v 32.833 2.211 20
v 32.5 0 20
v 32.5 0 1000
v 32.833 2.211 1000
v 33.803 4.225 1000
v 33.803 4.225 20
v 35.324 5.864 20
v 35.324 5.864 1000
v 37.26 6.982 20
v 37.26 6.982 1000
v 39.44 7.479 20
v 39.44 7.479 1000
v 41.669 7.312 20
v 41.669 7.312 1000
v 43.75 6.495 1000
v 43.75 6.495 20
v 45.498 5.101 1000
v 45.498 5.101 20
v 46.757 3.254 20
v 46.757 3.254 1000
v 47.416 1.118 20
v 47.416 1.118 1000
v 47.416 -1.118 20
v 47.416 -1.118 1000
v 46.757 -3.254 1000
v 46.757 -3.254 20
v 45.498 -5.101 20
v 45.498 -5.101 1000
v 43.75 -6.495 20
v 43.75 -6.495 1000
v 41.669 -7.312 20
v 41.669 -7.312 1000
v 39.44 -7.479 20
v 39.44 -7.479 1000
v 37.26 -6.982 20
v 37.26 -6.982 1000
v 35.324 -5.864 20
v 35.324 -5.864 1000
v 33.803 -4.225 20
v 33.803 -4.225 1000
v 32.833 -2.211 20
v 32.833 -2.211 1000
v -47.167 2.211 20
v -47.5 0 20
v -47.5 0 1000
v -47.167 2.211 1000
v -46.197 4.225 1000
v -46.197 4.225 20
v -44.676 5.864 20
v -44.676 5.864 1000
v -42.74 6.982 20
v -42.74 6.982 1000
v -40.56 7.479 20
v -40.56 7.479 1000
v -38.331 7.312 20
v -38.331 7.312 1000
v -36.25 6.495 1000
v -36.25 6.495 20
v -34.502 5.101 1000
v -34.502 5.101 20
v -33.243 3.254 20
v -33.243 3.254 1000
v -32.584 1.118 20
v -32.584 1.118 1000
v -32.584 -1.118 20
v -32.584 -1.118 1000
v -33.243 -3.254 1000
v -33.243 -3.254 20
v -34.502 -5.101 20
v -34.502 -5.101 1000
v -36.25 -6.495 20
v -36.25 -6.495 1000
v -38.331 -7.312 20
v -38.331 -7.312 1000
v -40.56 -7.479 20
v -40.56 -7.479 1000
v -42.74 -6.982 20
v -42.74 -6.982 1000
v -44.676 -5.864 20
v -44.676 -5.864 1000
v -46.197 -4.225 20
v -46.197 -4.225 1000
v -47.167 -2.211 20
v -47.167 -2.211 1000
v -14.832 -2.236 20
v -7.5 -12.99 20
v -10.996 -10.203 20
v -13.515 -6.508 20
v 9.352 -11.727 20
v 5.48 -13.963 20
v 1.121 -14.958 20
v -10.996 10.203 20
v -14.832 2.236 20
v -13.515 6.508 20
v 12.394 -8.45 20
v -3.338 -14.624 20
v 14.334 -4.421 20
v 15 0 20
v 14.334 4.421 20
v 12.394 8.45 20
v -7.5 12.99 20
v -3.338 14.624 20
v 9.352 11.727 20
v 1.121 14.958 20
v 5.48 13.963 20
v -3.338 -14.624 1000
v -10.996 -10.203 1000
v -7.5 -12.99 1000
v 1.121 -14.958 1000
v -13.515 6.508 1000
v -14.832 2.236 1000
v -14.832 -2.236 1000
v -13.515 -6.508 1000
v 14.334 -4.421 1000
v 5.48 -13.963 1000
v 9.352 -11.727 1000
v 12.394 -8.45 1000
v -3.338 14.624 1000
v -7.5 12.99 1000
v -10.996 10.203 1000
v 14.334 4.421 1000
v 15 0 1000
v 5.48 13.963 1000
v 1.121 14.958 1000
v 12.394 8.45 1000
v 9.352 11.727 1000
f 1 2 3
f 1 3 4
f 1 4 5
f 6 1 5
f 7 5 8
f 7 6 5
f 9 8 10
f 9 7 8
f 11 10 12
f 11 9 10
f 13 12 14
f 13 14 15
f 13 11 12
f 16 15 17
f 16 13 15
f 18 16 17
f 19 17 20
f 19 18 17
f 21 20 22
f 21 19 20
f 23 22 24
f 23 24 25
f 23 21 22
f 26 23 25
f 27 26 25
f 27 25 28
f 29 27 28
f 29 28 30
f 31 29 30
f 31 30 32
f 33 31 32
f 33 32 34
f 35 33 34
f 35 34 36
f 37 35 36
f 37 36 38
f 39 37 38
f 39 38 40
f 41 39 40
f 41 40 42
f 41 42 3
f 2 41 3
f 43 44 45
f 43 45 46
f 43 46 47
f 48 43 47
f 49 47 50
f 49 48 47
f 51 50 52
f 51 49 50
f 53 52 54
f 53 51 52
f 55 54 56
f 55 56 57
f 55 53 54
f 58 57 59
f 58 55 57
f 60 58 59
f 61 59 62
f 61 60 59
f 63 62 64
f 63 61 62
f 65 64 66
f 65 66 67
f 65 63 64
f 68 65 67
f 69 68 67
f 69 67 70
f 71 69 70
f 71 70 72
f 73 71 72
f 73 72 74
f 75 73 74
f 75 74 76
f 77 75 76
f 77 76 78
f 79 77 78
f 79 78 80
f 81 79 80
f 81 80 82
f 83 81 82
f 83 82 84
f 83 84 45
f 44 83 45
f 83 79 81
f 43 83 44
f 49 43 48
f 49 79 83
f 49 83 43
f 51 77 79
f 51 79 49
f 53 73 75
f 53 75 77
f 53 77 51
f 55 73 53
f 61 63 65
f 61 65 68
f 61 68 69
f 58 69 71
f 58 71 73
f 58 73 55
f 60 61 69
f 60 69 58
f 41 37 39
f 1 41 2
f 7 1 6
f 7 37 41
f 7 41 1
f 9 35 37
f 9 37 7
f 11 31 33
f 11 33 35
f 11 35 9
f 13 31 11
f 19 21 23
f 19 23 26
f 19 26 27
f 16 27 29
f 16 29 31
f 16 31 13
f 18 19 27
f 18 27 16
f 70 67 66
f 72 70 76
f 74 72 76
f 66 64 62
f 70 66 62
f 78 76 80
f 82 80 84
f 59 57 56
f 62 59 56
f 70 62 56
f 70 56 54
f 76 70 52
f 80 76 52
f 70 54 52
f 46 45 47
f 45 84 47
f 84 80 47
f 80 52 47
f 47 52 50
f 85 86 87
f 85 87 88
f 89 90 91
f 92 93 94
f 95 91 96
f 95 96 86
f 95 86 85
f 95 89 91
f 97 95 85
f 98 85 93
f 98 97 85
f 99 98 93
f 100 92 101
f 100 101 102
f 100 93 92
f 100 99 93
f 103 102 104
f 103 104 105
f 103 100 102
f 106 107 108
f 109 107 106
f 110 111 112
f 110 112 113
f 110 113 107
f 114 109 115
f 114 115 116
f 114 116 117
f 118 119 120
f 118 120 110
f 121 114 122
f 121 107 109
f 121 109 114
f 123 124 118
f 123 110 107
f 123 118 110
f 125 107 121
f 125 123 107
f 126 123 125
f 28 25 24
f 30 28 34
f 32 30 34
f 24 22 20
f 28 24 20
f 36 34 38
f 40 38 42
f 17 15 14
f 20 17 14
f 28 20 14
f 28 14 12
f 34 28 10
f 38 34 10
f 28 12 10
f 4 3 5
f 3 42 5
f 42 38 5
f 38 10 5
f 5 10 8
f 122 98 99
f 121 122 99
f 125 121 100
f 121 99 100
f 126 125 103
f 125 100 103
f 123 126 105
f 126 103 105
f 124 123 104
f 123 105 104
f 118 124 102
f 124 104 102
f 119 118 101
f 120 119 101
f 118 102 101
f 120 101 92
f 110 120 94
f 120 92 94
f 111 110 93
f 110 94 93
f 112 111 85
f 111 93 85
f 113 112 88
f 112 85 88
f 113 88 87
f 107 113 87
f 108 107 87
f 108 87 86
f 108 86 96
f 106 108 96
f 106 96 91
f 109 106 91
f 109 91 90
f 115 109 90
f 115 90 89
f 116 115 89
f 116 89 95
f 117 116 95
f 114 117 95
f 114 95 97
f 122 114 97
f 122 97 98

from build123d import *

# Parameters (mm, degrees)
SKETCH_1_R               = 15
EXTRUDE_1_DEPTH          = 1000
SKETCH_6_R               = 7.5
EXTRUDE_2_DEPTH          = 1000
EXTRUDE_2_2_DEPTH        = 1000
CUT_EXTRUDE_1_DEPTH      = 1006.547725945
CUT_EXTRUDE_1_DEPTH_BACK = 1006.547725945
SKETCH_7_W               = 43.373576948
SKETCH_7_H               = 87.109491317


with BuildPart() as part:
    # 草图1 → 凸台-拉伸1 (new body)
    with BuildSketch(Plane.XY):
        Circle(SKETCH_1_R)
    extrude(amount=EXTRUDE_1_DEPTH)


with BuildPart() as body_2:
    # 草图6 → 凸台-拉伸2 (new body)
    with BuildSketch(Plane(origin=(0, 0, 0), x_dir=(-1, 0, 0), z_dir=(0, 0, -1))):
        with Locations((-40, 0)):
            Circle(SKETCH_6_R)
    extrude(amount=-EXTRUDE_2_DEPTH)


with BuildPart() as body_3:
    # 草图6 → Extrude 2 2 (new body)
    with BuildSketch(Plane(origin=(0, 0, 0), x_dir=(-1, 0, 0), z_dir=(0, 0, -1))):
        with Locations((40, 0)):
            Circle(SKETCH_6_R)
    extrude(amount=-EXTRUDE_2_2_DEPTH)


with BuildPart() as cut_extrude_1_tool:
    # 草图7 → 切除-拉伸1 (new, two sides: drawn at the far end of the back side and taken through both)
    with BuildSketch(Plane.ZY.offset(56.908951495).offset(-CUT_EXTRUDE_1_DEPTH_BACK)):
        with Locations((-1.686788474, -10.270563655)):
            Rectangle(SKETCH_7_W, SKETCH_7_H)
    extrude(amount=CUT_EXTRUDE_1_DEPTH + CUT_EXTRUDE_1_DEPTH_BACK)


with BuildPart() as part_1:
    add(part.part)

    # 切除-拉伸1: cut by cut_extrude_1_tool
    add(cut_extrude_1_tool.part, mode=Mode.SUBTRACT)


with BuildPart() as body_2_1:
    add(body_2.part)

    # 切除-拉伸1: cut by cut_extrude_1_tool
    add(cut_extrude_1_tool.part, mode=Mode.SUBTRACT)


with BuildPart() as body_3_1:
    add(body_3.part)

    # 切除-拉伸1: cut by cut_extrude_1_tool
    add(cut_extrude_1_tool.part, mode=Mode.SUBTRACT)


solid = Compound([part_1.part, body_2_1.part, body_3_1.part])
